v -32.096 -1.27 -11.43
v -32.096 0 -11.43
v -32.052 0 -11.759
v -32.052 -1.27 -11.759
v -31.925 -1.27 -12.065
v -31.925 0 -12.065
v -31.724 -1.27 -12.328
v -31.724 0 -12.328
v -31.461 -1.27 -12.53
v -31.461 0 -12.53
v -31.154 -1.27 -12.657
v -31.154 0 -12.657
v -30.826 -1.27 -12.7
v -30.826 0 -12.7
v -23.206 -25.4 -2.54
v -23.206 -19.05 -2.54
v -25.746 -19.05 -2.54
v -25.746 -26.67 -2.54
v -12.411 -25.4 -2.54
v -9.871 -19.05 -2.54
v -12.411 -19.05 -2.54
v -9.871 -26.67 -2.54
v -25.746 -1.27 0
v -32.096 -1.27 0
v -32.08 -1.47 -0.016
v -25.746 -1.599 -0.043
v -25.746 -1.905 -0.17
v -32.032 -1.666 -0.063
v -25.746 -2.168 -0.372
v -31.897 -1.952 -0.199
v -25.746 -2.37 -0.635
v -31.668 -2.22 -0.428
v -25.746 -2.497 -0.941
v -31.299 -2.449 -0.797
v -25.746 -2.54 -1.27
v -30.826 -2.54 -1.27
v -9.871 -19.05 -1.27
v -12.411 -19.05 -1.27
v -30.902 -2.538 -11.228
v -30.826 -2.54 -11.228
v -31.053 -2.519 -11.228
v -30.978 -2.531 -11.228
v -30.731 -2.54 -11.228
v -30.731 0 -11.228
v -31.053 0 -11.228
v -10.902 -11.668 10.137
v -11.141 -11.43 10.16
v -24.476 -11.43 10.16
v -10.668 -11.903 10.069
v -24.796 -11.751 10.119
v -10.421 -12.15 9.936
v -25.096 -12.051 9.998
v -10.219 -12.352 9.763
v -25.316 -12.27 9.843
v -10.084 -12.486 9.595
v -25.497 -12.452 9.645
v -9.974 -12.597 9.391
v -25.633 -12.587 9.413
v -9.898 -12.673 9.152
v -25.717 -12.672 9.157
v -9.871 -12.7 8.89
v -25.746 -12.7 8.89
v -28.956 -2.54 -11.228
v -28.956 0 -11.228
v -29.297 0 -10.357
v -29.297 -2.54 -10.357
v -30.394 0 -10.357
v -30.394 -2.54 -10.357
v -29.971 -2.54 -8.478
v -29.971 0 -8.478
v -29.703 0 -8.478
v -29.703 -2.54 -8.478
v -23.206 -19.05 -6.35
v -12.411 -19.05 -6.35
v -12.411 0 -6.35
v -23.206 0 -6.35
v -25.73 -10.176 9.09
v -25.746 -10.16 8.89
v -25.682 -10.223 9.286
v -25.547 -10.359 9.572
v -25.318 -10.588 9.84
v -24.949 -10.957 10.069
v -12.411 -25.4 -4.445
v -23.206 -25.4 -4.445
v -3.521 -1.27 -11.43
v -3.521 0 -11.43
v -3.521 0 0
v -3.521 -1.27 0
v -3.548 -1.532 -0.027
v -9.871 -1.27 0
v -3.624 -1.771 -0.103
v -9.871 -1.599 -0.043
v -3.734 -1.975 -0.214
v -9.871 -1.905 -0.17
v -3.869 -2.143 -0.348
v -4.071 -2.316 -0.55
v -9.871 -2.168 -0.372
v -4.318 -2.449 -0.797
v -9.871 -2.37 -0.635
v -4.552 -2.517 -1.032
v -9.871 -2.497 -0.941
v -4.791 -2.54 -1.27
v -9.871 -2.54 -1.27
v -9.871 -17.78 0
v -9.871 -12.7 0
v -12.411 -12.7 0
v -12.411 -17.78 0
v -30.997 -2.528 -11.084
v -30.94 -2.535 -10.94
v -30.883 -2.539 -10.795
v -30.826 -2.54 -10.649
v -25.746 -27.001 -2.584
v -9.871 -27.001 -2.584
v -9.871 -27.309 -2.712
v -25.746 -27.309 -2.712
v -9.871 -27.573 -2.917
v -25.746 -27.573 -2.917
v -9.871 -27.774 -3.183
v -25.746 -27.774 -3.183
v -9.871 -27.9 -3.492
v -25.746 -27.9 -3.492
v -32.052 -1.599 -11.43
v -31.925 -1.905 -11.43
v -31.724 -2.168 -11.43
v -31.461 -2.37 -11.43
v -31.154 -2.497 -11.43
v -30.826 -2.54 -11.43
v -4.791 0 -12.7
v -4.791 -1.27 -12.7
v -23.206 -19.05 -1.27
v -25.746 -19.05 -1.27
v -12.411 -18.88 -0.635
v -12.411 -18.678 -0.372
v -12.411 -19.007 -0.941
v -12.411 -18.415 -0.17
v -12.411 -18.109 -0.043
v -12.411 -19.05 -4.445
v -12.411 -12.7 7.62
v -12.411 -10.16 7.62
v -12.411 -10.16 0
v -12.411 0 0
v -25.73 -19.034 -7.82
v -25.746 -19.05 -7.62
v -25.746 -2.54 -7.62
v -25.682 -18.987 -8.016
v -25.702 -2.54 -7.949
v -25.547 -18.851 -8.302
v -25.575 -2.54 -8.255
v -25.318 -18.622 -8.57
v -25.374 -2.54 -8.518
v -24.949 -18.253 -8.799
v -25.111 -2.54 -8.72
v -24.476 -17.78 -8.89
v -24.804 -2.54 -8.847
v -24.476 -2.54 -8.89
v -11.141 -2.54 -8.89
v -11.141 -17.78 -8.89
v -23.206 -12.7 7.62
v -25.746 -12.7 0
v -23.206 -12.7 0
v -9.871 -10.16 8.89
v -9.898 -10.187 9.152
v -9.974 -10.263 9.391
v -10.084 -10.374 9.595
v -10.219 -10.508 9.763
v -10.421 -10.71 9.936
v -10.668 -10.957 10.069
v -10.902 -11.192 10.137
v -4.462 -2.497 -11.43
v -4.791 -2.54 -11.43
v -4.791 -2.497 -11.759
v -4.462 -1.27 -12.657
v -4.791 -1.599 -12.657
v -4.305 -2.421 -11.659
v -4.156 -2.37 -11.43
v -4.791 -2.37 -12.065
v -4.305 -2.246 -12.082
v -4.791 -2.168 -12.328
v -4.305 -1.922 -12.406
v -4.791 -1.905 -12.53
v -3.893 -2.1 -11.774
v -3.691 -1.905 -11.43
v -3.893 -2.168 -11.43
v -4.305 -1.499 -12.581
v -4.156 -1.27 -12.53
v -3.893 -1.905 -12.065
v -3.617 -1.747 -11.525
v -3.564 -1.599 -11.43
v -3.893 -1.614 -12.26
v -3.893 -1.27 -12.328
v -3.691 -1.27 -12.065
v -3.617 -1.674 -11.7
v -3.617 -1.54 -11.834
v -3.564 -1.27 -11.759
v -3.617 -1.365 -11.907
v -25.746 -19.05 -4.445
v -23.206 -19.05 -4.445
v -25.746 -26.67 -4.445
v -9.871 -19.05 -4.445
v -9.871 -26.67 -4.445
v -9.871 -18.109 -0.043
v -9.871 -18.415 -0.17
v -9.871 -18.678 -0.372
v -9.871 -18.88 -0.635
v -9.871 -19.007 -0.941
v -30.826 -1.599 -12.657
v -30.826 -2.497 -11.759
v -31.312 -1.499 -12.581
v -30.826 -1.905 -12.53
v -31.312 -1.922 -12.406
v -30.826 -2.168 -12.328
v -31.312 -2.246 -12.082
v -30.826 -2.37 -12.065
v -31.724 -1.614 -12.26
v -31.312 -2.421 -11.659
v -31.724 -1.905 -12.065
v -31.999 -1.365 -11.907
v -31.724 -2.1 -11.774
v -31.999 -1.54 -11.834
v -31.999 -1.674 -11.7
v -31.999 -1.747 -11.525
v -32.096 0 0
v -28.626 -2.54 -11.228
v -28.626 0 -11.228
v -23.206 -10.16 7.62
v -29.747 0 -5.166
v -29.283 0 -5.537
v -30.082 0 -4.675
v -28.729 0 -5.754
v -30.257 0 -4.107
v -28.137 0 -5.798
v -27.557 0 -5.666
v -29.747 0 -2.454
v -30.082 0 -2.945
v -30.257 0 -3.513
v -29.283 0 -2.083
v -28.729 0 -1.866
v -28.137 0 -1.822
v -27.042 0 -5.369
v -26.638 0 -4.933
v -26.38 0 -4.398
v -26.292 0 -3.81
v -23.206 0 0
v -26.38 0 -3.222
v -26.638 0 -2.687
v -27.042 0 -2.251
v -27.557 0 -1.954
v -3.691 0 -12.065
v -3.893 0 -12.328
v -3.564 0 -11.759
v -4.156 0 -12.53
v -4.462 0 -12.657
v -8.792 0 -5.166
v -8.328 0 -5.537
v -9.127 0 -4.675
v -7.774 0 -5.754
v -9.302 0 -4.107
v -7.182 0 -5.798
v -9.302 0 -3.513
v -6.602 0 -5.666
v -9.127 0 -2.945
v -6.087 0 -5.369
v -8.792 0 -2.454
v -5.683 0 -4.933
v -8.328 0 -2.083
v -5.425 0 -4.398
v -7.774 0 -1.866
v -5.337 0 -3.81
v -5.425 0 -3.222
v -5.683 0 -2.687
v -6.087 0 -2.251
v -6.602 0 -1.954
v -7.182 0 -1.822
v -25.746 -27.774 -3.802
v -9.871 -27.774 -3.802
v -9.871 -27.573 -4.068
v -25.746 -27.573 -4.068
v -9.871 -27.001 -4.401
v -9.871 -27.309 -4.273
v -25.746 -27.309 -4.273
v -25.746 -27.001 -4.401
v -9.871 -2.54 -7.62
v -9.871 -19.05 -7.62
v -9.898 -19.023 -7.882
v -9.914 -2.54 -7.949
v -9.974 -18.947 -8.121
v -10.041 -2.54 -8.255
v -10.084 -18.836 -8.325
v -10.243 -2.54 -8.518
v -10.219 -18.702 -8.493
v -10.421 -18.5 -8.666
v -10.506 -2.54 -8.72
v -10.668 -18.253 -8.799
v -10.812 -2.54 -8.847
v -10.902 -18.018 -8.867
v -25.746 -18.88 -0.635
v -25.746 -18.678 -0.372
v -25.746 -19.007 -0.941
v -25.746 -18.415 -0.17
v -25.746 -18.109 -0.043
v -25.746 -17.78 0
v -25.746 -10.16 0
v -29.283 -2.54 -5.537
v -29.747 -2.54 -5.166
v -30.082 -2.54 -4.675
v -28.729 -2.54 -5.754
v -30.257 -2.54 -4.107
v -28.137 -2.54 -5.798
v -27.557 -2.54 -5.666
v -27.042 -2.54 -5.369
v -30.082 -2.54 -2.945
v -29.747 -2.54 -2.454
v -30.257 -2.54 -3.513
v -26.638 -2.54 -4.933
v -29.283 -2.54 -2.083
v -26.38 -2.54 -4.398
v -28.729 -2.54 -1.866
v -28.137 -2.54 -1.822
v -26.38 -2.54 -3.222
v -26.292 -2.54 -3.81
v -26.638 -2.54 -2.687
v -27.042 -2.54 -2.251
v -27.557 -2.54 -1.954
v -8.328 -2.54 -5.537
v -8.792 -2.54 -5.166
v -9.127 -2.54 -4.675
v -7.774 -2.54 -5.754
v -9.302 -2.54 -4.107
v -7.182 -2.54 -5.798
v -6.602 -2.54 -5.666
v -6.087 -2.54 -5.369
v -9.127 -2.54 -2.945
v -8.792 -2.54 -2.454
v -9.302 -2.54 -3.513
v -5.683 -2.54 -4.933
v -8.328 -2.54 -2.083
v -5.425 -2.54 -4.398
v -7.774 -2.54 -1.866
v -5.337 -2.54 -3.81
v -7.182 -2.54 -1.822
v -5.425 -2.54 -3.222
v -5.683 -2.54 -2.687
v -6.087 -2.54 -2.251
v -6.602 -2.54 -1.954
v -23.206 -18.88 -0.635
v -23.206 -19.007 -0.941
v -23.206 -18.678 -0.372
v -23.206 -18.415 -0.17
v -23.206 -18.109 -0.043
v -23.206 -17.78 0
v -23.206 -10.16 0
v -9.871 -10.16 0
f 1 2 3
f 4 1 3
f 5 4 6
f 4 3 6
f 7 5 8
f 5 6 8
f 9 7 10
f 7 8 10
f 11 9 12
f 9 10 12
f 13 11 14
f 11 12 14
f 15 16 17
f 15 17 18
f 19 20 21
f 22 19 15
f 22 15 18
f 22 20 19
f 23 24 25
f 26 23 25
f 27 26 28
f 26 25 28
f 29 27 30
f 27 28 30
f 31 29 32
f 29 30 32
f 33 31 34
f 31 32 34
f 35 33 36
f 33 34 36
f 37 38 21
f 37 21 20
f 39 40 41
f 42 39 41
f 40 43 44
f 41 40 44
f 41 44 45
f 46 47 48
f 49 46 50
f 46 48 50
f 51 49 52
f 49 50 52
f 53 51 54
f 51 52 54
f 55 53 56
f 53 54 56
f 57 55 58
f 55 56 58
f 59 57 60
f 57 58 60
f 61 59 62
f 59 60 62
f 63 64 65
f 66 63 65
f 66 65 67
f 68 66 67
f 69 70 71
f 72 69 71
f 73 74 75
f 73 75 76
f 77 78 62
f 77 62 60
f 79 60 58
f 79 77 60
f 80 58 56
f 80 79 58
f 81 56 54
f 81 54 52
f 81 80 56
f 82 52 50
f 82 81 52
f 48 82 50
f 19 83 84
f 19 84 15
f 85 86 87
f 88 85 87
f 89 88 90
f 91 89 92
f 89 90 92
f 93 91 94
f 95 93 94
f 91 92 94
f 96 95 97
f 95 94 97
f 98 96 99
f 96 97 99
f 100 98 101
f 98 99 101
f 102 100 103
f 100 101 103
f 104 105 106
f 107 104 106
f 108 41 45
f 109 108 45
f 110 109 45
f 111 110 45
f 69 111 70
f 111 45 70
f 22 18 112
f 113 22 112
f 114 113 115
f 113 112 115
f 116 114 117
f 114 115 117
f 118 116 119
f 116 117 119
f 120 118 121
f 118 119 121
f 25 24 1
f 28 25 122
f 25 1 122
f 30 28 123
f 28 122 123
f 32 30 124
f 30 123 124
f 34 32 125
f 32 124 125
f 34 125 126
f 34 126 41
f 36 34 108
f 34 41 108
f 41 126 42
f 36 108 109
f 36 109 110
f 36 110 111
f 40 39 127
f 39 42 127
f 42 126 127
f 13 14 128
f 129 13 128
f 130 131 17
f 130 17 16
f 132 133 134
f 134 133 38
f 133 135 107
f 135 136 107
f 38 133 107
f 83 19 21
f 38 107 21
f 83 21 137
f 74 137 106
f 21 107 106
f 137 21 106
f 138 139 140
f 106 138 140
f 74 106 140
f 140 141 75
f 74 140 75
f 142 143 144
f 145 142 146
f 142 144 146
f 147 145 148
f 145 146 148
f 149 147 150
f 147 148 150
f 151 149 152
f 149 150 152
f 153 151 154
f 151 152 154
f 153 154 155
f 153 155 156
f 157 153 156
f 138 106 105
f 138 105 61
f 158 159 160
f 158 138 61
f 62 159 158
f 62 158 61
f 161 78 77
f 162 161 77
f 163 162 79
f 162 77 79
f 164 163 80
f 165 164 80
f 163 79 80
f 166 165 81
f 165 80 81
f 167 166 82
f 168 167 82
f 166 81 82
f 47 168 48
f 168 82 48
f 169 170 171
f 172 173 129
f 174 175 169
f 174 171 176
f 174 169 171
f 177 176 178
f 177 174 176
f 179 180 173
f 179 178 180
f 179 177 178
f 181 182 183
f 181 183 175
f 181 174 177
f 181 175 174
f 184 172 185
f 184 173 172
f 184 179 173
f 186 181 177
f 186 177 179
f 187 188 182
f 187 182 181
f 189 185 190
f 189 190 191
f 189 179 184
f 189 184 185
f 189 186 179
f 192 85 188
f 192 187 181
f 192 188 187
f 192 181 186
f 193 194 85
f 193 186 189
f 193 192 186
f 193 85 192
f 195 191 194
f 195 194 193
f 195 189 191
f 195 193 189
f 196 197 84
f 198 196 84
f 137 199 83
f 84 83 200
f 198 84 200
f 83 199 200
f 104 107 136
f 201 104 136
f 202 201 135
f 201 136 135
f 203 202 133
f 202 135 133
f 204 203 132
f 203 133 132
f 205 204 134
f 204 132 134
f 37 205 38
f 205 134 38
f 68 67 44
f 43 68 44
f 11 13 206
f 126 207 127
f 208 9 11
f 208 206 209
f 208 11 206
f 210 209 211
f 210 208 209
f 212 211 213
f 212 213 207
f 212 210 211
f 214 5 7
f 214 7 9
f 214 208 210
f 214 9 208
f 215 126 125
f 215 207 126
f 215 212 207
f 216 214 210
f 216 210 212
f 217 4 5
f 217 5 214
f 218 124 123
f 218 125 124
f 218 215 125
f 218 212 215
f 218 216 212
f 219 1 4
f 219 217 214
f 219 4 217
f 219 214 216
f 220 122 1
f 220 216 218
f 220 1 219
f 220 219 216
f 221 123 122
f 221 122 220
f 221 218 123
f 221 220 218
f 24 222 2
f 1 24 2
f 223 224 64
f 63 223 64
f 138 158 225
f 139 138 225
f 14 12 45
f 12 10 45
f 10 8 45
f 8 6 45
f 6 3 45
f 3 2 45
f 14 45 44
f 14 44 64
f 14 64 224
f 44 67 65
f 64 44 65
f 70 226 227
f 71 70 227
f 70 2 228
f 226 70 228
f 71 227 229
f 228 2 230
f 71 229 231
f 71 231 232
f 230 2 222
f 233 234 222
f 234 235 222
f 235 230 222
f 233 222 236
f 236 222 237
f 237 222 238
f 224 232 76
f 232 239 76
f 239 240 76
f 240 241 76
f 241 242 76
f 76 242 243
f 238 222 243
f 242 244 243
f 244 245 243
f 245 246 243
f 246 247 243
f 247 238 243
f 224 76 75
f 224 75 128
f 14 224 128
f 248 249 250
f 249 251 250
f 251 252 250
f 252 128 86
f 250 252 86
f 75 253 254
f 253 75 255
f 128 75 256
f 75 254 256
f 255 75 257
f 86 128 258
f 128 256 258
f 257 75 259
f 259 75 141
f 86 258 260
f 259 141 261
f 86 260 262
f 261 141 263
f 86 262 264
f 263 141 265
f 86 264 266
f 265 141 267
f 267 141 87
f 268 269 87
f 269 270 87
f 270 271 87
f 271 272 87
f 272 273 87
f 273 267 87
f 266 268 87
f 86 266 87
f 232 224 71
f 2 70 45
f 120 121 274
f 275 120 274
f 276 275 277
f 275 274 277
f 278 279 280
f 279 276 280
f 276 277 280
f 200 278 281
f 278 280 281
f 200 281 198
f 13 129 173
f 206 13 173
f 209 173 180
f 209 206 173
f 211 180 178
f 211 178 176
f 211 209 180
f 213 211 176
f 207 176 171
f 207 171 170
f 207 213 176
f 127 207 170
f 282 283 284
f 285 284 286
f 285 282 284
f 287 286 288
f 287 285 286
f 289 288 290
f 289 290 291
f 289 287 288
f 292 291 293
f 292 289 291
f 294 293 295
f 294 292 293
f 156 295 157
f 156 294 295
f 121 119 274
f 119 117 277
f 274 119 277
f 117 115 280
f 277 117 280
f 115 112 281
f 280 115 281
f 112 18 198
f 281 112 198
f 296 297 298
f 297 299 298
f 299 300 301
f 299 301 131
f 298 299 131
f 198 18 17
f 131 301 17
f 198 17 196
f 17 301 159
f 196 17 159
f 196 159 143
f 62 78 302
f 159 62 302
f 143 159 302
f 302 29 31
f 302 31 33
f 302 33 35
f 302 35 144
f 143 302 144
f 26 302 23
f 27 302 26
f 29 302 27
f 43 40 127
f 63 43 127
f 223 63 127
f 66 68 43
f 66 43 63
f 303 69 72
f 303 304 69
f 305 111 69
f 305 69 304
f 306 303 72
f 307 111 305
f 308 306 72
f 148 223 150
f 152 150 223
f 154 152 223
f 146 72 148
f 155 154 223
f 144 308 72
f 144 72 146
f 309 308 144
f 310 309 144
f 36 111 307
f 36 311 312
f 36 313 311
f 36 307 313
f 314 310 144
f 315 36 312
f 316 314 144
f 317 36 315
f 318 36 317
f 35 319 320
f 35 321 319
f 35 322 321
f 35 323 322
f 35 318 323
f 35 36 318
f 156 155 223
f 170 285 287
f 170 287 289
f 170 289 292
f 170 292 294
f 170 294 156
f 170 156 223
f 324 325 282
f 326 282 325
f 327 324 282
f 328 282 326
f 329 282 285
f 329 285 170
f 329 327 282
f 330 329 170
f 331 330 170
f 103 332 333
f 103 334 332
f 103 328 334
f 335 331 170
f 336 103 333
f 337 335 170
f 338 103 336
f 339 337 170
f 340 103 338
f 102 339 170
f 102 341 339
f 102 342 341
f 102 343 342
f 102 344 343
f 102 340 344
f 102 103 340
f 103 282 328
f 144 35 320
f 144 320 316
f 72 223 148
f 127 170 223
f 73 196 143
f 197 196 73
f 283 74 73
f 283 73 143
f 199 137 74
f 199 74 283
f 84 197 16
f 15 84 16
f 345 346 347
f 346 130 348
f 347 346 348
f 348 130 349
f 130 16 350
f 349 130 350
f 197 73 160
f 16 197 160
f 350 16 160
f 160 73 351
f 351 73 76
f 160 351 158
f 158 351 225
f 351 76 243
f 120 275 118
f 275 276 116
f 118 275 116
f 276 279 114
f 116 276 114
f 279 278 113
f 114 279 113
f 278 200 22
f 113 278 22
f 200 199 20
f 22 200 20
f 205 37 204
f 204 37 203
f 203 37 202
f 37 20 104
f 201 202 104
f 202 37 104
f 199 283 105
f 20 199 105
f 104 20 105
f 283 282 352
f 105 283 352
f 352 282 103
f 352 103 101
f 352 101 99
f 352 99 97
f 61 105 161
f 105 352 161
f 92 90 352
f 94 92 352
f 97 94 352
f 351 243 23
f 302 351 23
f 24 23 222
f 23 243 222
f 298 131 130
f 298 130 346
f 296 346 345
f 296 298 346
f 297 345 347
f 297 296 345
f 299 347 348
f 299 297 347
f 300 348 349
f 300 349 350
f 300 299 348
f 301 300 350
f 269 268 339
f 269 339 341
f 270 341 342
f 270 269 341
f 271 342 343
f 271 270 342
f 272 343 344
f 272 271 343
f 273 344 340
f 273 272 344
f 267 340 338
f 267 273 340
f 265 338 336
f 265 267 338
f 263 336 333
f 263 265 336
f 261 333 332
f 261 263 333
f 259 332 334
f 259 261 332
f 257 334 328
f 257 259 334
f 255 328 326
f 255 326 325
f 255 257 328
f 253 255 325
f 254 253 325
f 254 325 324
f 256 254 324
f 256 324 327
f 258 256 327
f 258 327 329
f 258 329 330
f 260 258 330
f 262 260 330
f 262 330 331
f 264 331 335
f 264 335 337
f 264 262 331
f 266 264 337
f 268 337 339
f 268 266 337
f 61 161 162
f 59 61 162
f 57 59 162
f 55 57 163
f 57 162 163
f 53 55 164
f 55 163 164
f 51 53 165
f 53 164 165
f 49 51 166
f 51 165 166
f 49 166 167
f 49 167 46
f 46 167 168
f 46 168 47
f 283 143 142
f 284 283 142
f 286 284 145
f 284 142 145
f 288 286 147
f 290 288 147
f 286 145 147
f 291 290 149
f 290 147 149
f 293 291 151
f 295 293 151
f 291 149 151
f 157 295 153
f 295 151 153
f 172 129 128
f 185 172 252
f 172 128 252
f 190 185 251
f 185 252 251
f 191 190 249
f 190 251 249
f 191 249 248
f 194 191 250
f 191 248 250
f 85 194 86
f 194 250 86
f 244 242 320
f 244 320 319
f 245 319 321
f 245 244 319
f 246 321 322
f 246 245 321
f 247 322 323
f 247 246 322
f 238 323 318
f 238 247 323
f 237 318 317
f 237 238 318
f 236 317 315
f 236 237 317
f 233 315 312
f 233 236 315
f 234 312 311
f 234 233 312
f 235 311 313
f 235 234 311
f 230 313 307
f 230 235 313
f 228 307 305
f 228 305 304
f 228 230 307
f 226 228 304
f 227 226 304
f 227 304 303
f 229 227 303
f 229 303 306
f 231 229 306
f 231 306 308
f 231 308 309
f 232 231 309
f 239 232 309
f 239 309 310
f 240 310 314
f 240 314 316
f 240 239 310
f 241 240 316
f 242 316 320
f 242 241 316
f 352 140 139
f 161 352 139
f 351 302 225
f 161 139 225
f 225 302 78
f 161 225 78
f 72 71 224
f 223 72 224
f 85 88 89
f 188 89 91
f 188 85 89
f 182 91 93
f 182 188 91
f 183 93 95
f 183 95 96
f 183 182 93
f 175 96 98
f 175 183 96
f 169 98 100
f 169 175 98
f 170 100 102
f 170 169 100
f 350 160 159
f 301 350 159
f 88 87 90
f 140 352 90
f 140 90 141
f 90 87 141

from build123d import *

# Parameters (mm, degrees)
F1_DEPTH      = 19.05
F0_R          = 1.9939
F2_DEPTH      = 2.54
F3_W          = 2.54
F3_H          = 1.905
F4_DEPTH      = 8.89
F5_W          = 2.54
F5_H          = 1.905
F6_DEPTH      = 11.43
F7_W          = 2.54
F7_H          = 2.54
F8_W          = 2.54
F8_H          = 2.54
F9_DEPTH      = 10.16
F10_W         = 2.54
F10_H         = 2.54
F11_DEPTH     = 11.43
F12_T1_DEPTH  = 9.525
F12_T3_DEPTH  = 14.605
F12_T5_DEPTH  = 26.035
F12_T7_DEPTH  = 9.525
F12_T9_DEPTH  = 4.445
F12_T11_DEPTH = 19.685
F12_T13_DEPTH = 22.225
F12_T15_DEPTH = 8.89
F12_T17_DEPTH = 8.89
F12_T19_DEPTH = 8.89
F12_S23_W     = 1.27
F12_S23_H     = 1.27
F12_T24_DEPTH = 1.27
F12_S29_W     = 1.27
F12_S29_H     = 1.27
F12_T30_DEPTH = 1.27


# Not quite as in the source:
# - a fillet or chamfer that OpenCascade refuses, or shapes differently, is made with other operations: its cross-section is extruded or revolved along the edge and cut away or added


with BuildPart() as f1:
    # F0 (on Front) → F1 (new body)
    with BuildSketch(Plane.XZ):
        Polygon((-23.2056408978, -6.35), (-23.2056408978, 0), (-25.7456408978, 0), (-25.7456408978, -8.89), (-9.8706408978, -8.89), (-9.8706408978, 0), (-12.4106408978, 0), (-12.4106408978, -6.35), align=None)
    extrude(amount=F1_DEPTH)

    # F0 (on Front) → F2 (join)
    with BuildSketch(Plane.XZ):
        Polygon((-25.7456408978, -8.89), (-25.7456408978, 0), (-32.0956408978, 0), (-32.0956408978, -12.7), (-3.5206408978, -12.7), (-3.5206408978, 0), (-9.8706408978, 0), (-9.8706408978, -8.89), align=None)
        Polygon((-28.6261399051, -11.2280230969), (-28.955778145, -11.2280230969), (-29.2968038878, -10.3571788012), (-30.3941995557, -10.3571788012), (-30.7310299027, -11.2280230969), (-31.0534760356, -11.2280230969), (-29.9710639241, -8.4782408335), (-29.7031579363, -8.4782408335), align=None, mode=Mode.SUBTRACT)
        with Locations((-28.2856408978, -3.81)):
            Circle(F0_R, mode=Mode.SUBTRACT)
        with Locations((-7.3306408978, -3.81)):
            Circle(F0_R, mode=Mode.SUBTRACT)
    extrude(amount=F2_DEPTH)

    # F3 (on face) → F4 (join)
    with BuildSketch(Plane.XZ.offset(19.05)):
        with Locations((-11.1406408978, -3.4925)):
            Rectangle(F3_W, F3_H)
        with Locations((-24.4756408978, -3.4925)):
            Rectangle(F3_W, F3_H)
    extrude(amount=F4_DEPTH)

    # F5 (on face) → F6 (join)
    with BuildSketch(Plane(origin=(-12.4106408978, 0, 0), x_dir=(0, -1, 0), z_dir=(-1, 0, 0))):
        with Locations((26.67, -3.4925)):
            Rectangle(F5_W, F5_H)
    extrude(amount=F6_DEPTH)

    # F7 (on face) + F8 (on face) → F9 (join)
    with BuildSketch(Plane.XY):
        with Locations((-24.4756408978, -11.43)):
            Rectangle(F7_W, F7_H)
    with BuildSketch(Plane.XY):
        with Locations((-11.1406408978, -11.43)):
            Rectangle(F8_W, F8_H)
    extrude(amount=F9_DEPTH)

    # F10 (on face) → F11 (join)
    with BuildSketch(Plane.YZ.offset(-23.2056408978)):
        with Locations((-11.43, 8.89)):
            Rectangle(F10_W, F10_H)
    extrude(amount=F11_DEPTH)

    # F12: fillet of radius 1.27 on 18 edges, made by hand

    # F12_s2 → F12_t1 (cut)
    with BuildSketch(Plane.YZ.offset(-35.2706408978)):
        with BuildLine():
            ThreePointArc((-1.27, 0), (-2.1680256121, -0.3719743879), (-2.54, -1.27))
            Line((-2.54, -1.27), (-2.54, 0))
            Line((-2.54, 0), (-1.27, 0))
        make_face()
    extrude(amount=F12_T1_DEPTH, mode=Mode.SUBTRACT)

    # F12_s4 → F12_t3 (cut)
    with BuildSketch(Plane.XY.offset(-11.43)):
        with BuildLine():
            ThreePointArc((-32.0956408978, -1.27), (-31.7236665099, -2.1680256121), (-30.8256408978, -2.54))
            Line((-30.8256408978, -2.54), (-32.0956408978, -2.54))
            Line((-32.0956408978, -2.54), (-32.0956408978, -1.27))
        make_face()
        with BuildLine():
            ThreePointArc((-3.5206408978, -1.27), (-3.8926152856, -2.1680256121), (-4.7906408978, -2.54))
            Line((-4.7906408978, -2.54), (-3.5206408978, -2.54))
            Line((-3.5206408978, -2.54), (-3.5206408978, -1.27))
        make_face()
    extrude(amount=F12_T3_DEPTH, mode=Mode.SUBTRACT)

    # F12_s6 → F12_t5 (cut)
    with BuildSketch(Plane.YZ.offset(-30.8256408978)):
        with BuildLine():
            ThreePointArc((-1.27, -12.7), (-2.1680256121, -12.3280256121), (-2.54, -11.43))
            Line((-2.54, -11.43), (-2.54, -12.7))
            Line((-2.54, -12.7), (-1.27, -12.7))
        make_face()
    extrude(amount=F12_T5_DEPTH, mode=Mode.SUBTRACT)

    # F12_s8 → F12_t7 (cut)
    with BuildSketch(Plane.YZ.offset(-9.8706408978)):
        with BuildLine():
            ThreePointArc((-1.27, 0), (-2.1680256121, -0.3719743879), (-2.54, -1.27))
            Line((-2.54, -1.27), (-2.54, 0))
            Line((-2.54, 0), (-1.27, 0))
        make_face()
    extrude(amount=F12_T7_DEPTH, mode=Mode.SUBTRACT)

    # F12_s10 → F12_t9 (cut)
    with BuildSketch(Plane.XZ.offset(-3.175)):
        with BuildLine():
            ThreePointArc((-4.7906408978, -12.7), (-3.8926152856, -12.3280256121), (-3.5206408978, -11.43))
            Line((-3.5206408978, -11.43), (-3.5206408978, -12.7))
            Line((-3.5206408978, -12.7), (-4.7906408978, -12.7))
        make_face()
        with BuildLine():
            ThreePointArc((-32.0956408978, -11.43), (-31.7236665099, -12.3280256121), (-30.8256408978, -12.7))
            Line((-30.8256408978, -12.7), (-32.0956408978, -12.7))
            Line((-32.0956408978, -12.7), (-32.0956408978, -11.43))
        make_face()
    extrude(amount=F12_T9_DEPTH, mode=Mode.SUBTRACT)

    # F12_s12 → F12_t11 (cut)
    with BuildSketch(Plane.XZ.offset(2.54)):
        with BuildLine():
            ThreePointArc((-9.8706408978, -7.62), (-10.2426152856, -8.5180256121), (-11.1406408978, -8.89))
            Line((-11.1406408978, -8.89), (-9.8706408978, -8.89))
            Line((-9.8706408978, -8.89), (-9.8706408978, -7.62))
        make_face()
        with BuildLine():
            ThreePointArc((-25.7456408978, -7.62), (-25.3736665099, -8.5180256121), (-24.4756408978, -8.89))
            Line((-24.4756408978, -8.89), (-25.7456408978, -8.89))
            Line((-25.7456408978, -8.89), (-25.7456408978, -7.62))
        make_face()
    extrude(amount=F12_T11_DEPTH, mode=Mode.SUBTRACT)

    # F12_s14 → F12_t13 (cut)
    with BuildSketch(Plane.YZ.offset(-28.9206408978)):
        with BuildLine():
            ThreePointArc((-26.67, -2.54), (-27.5680256121, -2.9119743879), (-27.94, -3.81))
            Line((-27.94, -3.81), (-27.94, -2.54))
            Line((-27.94, -2.54), (-26.67, -2.54))
        make_face()
        with BuildLine():
            ThreePointArc((-19.05, -7.62), (-18.6780256121, -8.5180256121), (-17.78, -8.89))
            Line((-17.78, -8.89), (-19.05, -8.89))
            Line((-19.05, -8.89), (-19.05, -7.62))
        make_face()
        with BuildLine():
            ThreePointArc((-27.94, -3.175), (-27.5680256121, -4.0730256121), (-26.67, -4.445))
            Line((-26.67, -4.445), (-27.94, -4.445))
            Line((-27.94, -4.445), (-27.94, -3.175))
        make_face()
        with BuildLine():
            ThreePointArc((-11.43, 10.16), (-12.3280256121, 9.7880256121), (-12.7, 8.89))
            Line((-12.7, 8.89), (-12.7, 10.16))
            Line((-12.7, 10.16), (-11.43, 10.16))
        make_face()
        with BuildLine():
            ThreePointArc((-10.16, 8.89), (-10.5319743879, 9.7880256121), (-11.43, 10.16))
            Line((-11.43, 10.16), (-10.16, 10.16))
            Line((-10.16, 10.16), (-10.16, 8.89))
        make_face()
    extrude(amount=F12_T13_DEPTH, mode=Mode.SUBTRACT)

    # F12_s16 → F12_t15 (cut)
    with BuildSketch(Plane.YZ.offset(-28.9206408978)):
        with BuildLine():
            ThreePointArc((-19.05, -1.27), (-18.6780256121, -0.3719743879), (-17.78, 0))
            Line((-17.78, 0), (-19.05, 0))
            Line((-19.05, 0), (-19.05, -1.27))
        make_face()
    extrude(amount=F12_T15_DEPTH, mode=Mode.SUBTRACT)

    # F12_s18 → F12_t17 (cut)
    with BuildSketch(Plane.YZ.offset(-15.5856408978)):
        with BuildLine():
            ThreePointArc((-17.78, 0), (-18.6780256121, -0.3719743879), (-19.05, -1.27))
            Line((-19.05, -1.27), (-19.05, 0))
            Line((-19.05, 0), (-17.78, 0))
        make_face()
    extrude(amount=F12_T17_DEPTH, mode=Mode.SUBTRACT)

    # F12_s20 → F12_t19 (cut)
    with BuildSketch(Plane.XZ.offset(6.985)):
        with BuildLine():
            ThreePointArc((-25.7456408978, 8.89), (-25.3736665099, 9.7880256121), (-24.4756408978, 10.16))
            Line((-24.4756408978, 10.16), (-25.7456408978, 10.16))
            Line((-25.7456408978, 10.16), (-25.7456408978, 8.89))
        make_face()
        with BuildLine():
            ThreePointArc((-9.8706408978, 8.89), (-10.2426152856, 9.7880256121), (-11.1406408978, 10.16))
            Line((-11.1406408978, 10.16), (-9.8706408978, 10.16))
            Line((-9.8706408978, 10.16), (-9.8706408978, 8.89))
        make_face()
    extrude(amount=F12_T19_DEPTH, mode=Mode.SUBTRACT)


with BuildPart() as f12_tool22:
    # F12_s23 → F12_t24 (new body)
    with BuildSketch(Plane.YZ.offset(-30.8256408978)):
        with Locations((-1.905, -12.065)):
            Rectangle(F12_S23_W, F12_S23_H)
    extrude(amount=-F12_T24_DEPTH)

    # F12_s25 → F12_t26 (revolve, cut)
    with BuildSketch(Plane(origin=(-30.8256408978, -1.27, -11.43), x_dir=(0, 0.7071067812, 0.7071067812), z_dir=(0, -0.7071067812, 0.7071067812))):
        with BuildLine():
            ThreePointArc((0, -1.27), (1.27, 0), (0, 1.27))
            Line((0, 1.27), (0, -1.27))
        make_face()
    revolve(axis=Axis((-30.8256408978, -1.27, -11.43), (-1, 0, 0)), mode=Mode.SUBTRACT)


with BuildPart() as f1_1:
    add(f1.part)

    # F12_t21: cut F12_tool22
    add(f12_tool22.part, mode=Mode.SUBTRACT)


with BuildPart() as f12_tool28:
    # F12_s29 → F12_t30 (new body)
    with BuildSketch(Plane.YZ.offset(-4.7906408978)):
        with Locations((-1.905, -12.065)):
            Rectangle(F12_S29_W, F12_S29_H)
    extrude(amount=F12_T30_DEPTH)

    # F12_s31 → F12_t32 (revolve, cut)
    with BuildSketch(Plane(origin=(-4.7906408978, -1.27, -11.43), x_dir=(0, 0.7071067812, 0.7071067812), z_dir=(0, 0.7071067812, -0.7071067812))):
        with BuildLine():
            ThreePointArc((0, -1.27), (1.27, 0), (0, 1.27))
            Line((0, 1.27), (0, -1.27))
        make_face()
    revolve(axis=Axis((-4.7906408978, -1.27, -11.43), (1, 0, 0)), mode=Mode.SUBTRACT)


with BuildPart() as f1_2:
    add(f1_1.part)

    # F12_t27: cut F12_tool28
    add(f12_tool28.part, mode=Mode.SUBTRACT)


solid = f1_2.part
